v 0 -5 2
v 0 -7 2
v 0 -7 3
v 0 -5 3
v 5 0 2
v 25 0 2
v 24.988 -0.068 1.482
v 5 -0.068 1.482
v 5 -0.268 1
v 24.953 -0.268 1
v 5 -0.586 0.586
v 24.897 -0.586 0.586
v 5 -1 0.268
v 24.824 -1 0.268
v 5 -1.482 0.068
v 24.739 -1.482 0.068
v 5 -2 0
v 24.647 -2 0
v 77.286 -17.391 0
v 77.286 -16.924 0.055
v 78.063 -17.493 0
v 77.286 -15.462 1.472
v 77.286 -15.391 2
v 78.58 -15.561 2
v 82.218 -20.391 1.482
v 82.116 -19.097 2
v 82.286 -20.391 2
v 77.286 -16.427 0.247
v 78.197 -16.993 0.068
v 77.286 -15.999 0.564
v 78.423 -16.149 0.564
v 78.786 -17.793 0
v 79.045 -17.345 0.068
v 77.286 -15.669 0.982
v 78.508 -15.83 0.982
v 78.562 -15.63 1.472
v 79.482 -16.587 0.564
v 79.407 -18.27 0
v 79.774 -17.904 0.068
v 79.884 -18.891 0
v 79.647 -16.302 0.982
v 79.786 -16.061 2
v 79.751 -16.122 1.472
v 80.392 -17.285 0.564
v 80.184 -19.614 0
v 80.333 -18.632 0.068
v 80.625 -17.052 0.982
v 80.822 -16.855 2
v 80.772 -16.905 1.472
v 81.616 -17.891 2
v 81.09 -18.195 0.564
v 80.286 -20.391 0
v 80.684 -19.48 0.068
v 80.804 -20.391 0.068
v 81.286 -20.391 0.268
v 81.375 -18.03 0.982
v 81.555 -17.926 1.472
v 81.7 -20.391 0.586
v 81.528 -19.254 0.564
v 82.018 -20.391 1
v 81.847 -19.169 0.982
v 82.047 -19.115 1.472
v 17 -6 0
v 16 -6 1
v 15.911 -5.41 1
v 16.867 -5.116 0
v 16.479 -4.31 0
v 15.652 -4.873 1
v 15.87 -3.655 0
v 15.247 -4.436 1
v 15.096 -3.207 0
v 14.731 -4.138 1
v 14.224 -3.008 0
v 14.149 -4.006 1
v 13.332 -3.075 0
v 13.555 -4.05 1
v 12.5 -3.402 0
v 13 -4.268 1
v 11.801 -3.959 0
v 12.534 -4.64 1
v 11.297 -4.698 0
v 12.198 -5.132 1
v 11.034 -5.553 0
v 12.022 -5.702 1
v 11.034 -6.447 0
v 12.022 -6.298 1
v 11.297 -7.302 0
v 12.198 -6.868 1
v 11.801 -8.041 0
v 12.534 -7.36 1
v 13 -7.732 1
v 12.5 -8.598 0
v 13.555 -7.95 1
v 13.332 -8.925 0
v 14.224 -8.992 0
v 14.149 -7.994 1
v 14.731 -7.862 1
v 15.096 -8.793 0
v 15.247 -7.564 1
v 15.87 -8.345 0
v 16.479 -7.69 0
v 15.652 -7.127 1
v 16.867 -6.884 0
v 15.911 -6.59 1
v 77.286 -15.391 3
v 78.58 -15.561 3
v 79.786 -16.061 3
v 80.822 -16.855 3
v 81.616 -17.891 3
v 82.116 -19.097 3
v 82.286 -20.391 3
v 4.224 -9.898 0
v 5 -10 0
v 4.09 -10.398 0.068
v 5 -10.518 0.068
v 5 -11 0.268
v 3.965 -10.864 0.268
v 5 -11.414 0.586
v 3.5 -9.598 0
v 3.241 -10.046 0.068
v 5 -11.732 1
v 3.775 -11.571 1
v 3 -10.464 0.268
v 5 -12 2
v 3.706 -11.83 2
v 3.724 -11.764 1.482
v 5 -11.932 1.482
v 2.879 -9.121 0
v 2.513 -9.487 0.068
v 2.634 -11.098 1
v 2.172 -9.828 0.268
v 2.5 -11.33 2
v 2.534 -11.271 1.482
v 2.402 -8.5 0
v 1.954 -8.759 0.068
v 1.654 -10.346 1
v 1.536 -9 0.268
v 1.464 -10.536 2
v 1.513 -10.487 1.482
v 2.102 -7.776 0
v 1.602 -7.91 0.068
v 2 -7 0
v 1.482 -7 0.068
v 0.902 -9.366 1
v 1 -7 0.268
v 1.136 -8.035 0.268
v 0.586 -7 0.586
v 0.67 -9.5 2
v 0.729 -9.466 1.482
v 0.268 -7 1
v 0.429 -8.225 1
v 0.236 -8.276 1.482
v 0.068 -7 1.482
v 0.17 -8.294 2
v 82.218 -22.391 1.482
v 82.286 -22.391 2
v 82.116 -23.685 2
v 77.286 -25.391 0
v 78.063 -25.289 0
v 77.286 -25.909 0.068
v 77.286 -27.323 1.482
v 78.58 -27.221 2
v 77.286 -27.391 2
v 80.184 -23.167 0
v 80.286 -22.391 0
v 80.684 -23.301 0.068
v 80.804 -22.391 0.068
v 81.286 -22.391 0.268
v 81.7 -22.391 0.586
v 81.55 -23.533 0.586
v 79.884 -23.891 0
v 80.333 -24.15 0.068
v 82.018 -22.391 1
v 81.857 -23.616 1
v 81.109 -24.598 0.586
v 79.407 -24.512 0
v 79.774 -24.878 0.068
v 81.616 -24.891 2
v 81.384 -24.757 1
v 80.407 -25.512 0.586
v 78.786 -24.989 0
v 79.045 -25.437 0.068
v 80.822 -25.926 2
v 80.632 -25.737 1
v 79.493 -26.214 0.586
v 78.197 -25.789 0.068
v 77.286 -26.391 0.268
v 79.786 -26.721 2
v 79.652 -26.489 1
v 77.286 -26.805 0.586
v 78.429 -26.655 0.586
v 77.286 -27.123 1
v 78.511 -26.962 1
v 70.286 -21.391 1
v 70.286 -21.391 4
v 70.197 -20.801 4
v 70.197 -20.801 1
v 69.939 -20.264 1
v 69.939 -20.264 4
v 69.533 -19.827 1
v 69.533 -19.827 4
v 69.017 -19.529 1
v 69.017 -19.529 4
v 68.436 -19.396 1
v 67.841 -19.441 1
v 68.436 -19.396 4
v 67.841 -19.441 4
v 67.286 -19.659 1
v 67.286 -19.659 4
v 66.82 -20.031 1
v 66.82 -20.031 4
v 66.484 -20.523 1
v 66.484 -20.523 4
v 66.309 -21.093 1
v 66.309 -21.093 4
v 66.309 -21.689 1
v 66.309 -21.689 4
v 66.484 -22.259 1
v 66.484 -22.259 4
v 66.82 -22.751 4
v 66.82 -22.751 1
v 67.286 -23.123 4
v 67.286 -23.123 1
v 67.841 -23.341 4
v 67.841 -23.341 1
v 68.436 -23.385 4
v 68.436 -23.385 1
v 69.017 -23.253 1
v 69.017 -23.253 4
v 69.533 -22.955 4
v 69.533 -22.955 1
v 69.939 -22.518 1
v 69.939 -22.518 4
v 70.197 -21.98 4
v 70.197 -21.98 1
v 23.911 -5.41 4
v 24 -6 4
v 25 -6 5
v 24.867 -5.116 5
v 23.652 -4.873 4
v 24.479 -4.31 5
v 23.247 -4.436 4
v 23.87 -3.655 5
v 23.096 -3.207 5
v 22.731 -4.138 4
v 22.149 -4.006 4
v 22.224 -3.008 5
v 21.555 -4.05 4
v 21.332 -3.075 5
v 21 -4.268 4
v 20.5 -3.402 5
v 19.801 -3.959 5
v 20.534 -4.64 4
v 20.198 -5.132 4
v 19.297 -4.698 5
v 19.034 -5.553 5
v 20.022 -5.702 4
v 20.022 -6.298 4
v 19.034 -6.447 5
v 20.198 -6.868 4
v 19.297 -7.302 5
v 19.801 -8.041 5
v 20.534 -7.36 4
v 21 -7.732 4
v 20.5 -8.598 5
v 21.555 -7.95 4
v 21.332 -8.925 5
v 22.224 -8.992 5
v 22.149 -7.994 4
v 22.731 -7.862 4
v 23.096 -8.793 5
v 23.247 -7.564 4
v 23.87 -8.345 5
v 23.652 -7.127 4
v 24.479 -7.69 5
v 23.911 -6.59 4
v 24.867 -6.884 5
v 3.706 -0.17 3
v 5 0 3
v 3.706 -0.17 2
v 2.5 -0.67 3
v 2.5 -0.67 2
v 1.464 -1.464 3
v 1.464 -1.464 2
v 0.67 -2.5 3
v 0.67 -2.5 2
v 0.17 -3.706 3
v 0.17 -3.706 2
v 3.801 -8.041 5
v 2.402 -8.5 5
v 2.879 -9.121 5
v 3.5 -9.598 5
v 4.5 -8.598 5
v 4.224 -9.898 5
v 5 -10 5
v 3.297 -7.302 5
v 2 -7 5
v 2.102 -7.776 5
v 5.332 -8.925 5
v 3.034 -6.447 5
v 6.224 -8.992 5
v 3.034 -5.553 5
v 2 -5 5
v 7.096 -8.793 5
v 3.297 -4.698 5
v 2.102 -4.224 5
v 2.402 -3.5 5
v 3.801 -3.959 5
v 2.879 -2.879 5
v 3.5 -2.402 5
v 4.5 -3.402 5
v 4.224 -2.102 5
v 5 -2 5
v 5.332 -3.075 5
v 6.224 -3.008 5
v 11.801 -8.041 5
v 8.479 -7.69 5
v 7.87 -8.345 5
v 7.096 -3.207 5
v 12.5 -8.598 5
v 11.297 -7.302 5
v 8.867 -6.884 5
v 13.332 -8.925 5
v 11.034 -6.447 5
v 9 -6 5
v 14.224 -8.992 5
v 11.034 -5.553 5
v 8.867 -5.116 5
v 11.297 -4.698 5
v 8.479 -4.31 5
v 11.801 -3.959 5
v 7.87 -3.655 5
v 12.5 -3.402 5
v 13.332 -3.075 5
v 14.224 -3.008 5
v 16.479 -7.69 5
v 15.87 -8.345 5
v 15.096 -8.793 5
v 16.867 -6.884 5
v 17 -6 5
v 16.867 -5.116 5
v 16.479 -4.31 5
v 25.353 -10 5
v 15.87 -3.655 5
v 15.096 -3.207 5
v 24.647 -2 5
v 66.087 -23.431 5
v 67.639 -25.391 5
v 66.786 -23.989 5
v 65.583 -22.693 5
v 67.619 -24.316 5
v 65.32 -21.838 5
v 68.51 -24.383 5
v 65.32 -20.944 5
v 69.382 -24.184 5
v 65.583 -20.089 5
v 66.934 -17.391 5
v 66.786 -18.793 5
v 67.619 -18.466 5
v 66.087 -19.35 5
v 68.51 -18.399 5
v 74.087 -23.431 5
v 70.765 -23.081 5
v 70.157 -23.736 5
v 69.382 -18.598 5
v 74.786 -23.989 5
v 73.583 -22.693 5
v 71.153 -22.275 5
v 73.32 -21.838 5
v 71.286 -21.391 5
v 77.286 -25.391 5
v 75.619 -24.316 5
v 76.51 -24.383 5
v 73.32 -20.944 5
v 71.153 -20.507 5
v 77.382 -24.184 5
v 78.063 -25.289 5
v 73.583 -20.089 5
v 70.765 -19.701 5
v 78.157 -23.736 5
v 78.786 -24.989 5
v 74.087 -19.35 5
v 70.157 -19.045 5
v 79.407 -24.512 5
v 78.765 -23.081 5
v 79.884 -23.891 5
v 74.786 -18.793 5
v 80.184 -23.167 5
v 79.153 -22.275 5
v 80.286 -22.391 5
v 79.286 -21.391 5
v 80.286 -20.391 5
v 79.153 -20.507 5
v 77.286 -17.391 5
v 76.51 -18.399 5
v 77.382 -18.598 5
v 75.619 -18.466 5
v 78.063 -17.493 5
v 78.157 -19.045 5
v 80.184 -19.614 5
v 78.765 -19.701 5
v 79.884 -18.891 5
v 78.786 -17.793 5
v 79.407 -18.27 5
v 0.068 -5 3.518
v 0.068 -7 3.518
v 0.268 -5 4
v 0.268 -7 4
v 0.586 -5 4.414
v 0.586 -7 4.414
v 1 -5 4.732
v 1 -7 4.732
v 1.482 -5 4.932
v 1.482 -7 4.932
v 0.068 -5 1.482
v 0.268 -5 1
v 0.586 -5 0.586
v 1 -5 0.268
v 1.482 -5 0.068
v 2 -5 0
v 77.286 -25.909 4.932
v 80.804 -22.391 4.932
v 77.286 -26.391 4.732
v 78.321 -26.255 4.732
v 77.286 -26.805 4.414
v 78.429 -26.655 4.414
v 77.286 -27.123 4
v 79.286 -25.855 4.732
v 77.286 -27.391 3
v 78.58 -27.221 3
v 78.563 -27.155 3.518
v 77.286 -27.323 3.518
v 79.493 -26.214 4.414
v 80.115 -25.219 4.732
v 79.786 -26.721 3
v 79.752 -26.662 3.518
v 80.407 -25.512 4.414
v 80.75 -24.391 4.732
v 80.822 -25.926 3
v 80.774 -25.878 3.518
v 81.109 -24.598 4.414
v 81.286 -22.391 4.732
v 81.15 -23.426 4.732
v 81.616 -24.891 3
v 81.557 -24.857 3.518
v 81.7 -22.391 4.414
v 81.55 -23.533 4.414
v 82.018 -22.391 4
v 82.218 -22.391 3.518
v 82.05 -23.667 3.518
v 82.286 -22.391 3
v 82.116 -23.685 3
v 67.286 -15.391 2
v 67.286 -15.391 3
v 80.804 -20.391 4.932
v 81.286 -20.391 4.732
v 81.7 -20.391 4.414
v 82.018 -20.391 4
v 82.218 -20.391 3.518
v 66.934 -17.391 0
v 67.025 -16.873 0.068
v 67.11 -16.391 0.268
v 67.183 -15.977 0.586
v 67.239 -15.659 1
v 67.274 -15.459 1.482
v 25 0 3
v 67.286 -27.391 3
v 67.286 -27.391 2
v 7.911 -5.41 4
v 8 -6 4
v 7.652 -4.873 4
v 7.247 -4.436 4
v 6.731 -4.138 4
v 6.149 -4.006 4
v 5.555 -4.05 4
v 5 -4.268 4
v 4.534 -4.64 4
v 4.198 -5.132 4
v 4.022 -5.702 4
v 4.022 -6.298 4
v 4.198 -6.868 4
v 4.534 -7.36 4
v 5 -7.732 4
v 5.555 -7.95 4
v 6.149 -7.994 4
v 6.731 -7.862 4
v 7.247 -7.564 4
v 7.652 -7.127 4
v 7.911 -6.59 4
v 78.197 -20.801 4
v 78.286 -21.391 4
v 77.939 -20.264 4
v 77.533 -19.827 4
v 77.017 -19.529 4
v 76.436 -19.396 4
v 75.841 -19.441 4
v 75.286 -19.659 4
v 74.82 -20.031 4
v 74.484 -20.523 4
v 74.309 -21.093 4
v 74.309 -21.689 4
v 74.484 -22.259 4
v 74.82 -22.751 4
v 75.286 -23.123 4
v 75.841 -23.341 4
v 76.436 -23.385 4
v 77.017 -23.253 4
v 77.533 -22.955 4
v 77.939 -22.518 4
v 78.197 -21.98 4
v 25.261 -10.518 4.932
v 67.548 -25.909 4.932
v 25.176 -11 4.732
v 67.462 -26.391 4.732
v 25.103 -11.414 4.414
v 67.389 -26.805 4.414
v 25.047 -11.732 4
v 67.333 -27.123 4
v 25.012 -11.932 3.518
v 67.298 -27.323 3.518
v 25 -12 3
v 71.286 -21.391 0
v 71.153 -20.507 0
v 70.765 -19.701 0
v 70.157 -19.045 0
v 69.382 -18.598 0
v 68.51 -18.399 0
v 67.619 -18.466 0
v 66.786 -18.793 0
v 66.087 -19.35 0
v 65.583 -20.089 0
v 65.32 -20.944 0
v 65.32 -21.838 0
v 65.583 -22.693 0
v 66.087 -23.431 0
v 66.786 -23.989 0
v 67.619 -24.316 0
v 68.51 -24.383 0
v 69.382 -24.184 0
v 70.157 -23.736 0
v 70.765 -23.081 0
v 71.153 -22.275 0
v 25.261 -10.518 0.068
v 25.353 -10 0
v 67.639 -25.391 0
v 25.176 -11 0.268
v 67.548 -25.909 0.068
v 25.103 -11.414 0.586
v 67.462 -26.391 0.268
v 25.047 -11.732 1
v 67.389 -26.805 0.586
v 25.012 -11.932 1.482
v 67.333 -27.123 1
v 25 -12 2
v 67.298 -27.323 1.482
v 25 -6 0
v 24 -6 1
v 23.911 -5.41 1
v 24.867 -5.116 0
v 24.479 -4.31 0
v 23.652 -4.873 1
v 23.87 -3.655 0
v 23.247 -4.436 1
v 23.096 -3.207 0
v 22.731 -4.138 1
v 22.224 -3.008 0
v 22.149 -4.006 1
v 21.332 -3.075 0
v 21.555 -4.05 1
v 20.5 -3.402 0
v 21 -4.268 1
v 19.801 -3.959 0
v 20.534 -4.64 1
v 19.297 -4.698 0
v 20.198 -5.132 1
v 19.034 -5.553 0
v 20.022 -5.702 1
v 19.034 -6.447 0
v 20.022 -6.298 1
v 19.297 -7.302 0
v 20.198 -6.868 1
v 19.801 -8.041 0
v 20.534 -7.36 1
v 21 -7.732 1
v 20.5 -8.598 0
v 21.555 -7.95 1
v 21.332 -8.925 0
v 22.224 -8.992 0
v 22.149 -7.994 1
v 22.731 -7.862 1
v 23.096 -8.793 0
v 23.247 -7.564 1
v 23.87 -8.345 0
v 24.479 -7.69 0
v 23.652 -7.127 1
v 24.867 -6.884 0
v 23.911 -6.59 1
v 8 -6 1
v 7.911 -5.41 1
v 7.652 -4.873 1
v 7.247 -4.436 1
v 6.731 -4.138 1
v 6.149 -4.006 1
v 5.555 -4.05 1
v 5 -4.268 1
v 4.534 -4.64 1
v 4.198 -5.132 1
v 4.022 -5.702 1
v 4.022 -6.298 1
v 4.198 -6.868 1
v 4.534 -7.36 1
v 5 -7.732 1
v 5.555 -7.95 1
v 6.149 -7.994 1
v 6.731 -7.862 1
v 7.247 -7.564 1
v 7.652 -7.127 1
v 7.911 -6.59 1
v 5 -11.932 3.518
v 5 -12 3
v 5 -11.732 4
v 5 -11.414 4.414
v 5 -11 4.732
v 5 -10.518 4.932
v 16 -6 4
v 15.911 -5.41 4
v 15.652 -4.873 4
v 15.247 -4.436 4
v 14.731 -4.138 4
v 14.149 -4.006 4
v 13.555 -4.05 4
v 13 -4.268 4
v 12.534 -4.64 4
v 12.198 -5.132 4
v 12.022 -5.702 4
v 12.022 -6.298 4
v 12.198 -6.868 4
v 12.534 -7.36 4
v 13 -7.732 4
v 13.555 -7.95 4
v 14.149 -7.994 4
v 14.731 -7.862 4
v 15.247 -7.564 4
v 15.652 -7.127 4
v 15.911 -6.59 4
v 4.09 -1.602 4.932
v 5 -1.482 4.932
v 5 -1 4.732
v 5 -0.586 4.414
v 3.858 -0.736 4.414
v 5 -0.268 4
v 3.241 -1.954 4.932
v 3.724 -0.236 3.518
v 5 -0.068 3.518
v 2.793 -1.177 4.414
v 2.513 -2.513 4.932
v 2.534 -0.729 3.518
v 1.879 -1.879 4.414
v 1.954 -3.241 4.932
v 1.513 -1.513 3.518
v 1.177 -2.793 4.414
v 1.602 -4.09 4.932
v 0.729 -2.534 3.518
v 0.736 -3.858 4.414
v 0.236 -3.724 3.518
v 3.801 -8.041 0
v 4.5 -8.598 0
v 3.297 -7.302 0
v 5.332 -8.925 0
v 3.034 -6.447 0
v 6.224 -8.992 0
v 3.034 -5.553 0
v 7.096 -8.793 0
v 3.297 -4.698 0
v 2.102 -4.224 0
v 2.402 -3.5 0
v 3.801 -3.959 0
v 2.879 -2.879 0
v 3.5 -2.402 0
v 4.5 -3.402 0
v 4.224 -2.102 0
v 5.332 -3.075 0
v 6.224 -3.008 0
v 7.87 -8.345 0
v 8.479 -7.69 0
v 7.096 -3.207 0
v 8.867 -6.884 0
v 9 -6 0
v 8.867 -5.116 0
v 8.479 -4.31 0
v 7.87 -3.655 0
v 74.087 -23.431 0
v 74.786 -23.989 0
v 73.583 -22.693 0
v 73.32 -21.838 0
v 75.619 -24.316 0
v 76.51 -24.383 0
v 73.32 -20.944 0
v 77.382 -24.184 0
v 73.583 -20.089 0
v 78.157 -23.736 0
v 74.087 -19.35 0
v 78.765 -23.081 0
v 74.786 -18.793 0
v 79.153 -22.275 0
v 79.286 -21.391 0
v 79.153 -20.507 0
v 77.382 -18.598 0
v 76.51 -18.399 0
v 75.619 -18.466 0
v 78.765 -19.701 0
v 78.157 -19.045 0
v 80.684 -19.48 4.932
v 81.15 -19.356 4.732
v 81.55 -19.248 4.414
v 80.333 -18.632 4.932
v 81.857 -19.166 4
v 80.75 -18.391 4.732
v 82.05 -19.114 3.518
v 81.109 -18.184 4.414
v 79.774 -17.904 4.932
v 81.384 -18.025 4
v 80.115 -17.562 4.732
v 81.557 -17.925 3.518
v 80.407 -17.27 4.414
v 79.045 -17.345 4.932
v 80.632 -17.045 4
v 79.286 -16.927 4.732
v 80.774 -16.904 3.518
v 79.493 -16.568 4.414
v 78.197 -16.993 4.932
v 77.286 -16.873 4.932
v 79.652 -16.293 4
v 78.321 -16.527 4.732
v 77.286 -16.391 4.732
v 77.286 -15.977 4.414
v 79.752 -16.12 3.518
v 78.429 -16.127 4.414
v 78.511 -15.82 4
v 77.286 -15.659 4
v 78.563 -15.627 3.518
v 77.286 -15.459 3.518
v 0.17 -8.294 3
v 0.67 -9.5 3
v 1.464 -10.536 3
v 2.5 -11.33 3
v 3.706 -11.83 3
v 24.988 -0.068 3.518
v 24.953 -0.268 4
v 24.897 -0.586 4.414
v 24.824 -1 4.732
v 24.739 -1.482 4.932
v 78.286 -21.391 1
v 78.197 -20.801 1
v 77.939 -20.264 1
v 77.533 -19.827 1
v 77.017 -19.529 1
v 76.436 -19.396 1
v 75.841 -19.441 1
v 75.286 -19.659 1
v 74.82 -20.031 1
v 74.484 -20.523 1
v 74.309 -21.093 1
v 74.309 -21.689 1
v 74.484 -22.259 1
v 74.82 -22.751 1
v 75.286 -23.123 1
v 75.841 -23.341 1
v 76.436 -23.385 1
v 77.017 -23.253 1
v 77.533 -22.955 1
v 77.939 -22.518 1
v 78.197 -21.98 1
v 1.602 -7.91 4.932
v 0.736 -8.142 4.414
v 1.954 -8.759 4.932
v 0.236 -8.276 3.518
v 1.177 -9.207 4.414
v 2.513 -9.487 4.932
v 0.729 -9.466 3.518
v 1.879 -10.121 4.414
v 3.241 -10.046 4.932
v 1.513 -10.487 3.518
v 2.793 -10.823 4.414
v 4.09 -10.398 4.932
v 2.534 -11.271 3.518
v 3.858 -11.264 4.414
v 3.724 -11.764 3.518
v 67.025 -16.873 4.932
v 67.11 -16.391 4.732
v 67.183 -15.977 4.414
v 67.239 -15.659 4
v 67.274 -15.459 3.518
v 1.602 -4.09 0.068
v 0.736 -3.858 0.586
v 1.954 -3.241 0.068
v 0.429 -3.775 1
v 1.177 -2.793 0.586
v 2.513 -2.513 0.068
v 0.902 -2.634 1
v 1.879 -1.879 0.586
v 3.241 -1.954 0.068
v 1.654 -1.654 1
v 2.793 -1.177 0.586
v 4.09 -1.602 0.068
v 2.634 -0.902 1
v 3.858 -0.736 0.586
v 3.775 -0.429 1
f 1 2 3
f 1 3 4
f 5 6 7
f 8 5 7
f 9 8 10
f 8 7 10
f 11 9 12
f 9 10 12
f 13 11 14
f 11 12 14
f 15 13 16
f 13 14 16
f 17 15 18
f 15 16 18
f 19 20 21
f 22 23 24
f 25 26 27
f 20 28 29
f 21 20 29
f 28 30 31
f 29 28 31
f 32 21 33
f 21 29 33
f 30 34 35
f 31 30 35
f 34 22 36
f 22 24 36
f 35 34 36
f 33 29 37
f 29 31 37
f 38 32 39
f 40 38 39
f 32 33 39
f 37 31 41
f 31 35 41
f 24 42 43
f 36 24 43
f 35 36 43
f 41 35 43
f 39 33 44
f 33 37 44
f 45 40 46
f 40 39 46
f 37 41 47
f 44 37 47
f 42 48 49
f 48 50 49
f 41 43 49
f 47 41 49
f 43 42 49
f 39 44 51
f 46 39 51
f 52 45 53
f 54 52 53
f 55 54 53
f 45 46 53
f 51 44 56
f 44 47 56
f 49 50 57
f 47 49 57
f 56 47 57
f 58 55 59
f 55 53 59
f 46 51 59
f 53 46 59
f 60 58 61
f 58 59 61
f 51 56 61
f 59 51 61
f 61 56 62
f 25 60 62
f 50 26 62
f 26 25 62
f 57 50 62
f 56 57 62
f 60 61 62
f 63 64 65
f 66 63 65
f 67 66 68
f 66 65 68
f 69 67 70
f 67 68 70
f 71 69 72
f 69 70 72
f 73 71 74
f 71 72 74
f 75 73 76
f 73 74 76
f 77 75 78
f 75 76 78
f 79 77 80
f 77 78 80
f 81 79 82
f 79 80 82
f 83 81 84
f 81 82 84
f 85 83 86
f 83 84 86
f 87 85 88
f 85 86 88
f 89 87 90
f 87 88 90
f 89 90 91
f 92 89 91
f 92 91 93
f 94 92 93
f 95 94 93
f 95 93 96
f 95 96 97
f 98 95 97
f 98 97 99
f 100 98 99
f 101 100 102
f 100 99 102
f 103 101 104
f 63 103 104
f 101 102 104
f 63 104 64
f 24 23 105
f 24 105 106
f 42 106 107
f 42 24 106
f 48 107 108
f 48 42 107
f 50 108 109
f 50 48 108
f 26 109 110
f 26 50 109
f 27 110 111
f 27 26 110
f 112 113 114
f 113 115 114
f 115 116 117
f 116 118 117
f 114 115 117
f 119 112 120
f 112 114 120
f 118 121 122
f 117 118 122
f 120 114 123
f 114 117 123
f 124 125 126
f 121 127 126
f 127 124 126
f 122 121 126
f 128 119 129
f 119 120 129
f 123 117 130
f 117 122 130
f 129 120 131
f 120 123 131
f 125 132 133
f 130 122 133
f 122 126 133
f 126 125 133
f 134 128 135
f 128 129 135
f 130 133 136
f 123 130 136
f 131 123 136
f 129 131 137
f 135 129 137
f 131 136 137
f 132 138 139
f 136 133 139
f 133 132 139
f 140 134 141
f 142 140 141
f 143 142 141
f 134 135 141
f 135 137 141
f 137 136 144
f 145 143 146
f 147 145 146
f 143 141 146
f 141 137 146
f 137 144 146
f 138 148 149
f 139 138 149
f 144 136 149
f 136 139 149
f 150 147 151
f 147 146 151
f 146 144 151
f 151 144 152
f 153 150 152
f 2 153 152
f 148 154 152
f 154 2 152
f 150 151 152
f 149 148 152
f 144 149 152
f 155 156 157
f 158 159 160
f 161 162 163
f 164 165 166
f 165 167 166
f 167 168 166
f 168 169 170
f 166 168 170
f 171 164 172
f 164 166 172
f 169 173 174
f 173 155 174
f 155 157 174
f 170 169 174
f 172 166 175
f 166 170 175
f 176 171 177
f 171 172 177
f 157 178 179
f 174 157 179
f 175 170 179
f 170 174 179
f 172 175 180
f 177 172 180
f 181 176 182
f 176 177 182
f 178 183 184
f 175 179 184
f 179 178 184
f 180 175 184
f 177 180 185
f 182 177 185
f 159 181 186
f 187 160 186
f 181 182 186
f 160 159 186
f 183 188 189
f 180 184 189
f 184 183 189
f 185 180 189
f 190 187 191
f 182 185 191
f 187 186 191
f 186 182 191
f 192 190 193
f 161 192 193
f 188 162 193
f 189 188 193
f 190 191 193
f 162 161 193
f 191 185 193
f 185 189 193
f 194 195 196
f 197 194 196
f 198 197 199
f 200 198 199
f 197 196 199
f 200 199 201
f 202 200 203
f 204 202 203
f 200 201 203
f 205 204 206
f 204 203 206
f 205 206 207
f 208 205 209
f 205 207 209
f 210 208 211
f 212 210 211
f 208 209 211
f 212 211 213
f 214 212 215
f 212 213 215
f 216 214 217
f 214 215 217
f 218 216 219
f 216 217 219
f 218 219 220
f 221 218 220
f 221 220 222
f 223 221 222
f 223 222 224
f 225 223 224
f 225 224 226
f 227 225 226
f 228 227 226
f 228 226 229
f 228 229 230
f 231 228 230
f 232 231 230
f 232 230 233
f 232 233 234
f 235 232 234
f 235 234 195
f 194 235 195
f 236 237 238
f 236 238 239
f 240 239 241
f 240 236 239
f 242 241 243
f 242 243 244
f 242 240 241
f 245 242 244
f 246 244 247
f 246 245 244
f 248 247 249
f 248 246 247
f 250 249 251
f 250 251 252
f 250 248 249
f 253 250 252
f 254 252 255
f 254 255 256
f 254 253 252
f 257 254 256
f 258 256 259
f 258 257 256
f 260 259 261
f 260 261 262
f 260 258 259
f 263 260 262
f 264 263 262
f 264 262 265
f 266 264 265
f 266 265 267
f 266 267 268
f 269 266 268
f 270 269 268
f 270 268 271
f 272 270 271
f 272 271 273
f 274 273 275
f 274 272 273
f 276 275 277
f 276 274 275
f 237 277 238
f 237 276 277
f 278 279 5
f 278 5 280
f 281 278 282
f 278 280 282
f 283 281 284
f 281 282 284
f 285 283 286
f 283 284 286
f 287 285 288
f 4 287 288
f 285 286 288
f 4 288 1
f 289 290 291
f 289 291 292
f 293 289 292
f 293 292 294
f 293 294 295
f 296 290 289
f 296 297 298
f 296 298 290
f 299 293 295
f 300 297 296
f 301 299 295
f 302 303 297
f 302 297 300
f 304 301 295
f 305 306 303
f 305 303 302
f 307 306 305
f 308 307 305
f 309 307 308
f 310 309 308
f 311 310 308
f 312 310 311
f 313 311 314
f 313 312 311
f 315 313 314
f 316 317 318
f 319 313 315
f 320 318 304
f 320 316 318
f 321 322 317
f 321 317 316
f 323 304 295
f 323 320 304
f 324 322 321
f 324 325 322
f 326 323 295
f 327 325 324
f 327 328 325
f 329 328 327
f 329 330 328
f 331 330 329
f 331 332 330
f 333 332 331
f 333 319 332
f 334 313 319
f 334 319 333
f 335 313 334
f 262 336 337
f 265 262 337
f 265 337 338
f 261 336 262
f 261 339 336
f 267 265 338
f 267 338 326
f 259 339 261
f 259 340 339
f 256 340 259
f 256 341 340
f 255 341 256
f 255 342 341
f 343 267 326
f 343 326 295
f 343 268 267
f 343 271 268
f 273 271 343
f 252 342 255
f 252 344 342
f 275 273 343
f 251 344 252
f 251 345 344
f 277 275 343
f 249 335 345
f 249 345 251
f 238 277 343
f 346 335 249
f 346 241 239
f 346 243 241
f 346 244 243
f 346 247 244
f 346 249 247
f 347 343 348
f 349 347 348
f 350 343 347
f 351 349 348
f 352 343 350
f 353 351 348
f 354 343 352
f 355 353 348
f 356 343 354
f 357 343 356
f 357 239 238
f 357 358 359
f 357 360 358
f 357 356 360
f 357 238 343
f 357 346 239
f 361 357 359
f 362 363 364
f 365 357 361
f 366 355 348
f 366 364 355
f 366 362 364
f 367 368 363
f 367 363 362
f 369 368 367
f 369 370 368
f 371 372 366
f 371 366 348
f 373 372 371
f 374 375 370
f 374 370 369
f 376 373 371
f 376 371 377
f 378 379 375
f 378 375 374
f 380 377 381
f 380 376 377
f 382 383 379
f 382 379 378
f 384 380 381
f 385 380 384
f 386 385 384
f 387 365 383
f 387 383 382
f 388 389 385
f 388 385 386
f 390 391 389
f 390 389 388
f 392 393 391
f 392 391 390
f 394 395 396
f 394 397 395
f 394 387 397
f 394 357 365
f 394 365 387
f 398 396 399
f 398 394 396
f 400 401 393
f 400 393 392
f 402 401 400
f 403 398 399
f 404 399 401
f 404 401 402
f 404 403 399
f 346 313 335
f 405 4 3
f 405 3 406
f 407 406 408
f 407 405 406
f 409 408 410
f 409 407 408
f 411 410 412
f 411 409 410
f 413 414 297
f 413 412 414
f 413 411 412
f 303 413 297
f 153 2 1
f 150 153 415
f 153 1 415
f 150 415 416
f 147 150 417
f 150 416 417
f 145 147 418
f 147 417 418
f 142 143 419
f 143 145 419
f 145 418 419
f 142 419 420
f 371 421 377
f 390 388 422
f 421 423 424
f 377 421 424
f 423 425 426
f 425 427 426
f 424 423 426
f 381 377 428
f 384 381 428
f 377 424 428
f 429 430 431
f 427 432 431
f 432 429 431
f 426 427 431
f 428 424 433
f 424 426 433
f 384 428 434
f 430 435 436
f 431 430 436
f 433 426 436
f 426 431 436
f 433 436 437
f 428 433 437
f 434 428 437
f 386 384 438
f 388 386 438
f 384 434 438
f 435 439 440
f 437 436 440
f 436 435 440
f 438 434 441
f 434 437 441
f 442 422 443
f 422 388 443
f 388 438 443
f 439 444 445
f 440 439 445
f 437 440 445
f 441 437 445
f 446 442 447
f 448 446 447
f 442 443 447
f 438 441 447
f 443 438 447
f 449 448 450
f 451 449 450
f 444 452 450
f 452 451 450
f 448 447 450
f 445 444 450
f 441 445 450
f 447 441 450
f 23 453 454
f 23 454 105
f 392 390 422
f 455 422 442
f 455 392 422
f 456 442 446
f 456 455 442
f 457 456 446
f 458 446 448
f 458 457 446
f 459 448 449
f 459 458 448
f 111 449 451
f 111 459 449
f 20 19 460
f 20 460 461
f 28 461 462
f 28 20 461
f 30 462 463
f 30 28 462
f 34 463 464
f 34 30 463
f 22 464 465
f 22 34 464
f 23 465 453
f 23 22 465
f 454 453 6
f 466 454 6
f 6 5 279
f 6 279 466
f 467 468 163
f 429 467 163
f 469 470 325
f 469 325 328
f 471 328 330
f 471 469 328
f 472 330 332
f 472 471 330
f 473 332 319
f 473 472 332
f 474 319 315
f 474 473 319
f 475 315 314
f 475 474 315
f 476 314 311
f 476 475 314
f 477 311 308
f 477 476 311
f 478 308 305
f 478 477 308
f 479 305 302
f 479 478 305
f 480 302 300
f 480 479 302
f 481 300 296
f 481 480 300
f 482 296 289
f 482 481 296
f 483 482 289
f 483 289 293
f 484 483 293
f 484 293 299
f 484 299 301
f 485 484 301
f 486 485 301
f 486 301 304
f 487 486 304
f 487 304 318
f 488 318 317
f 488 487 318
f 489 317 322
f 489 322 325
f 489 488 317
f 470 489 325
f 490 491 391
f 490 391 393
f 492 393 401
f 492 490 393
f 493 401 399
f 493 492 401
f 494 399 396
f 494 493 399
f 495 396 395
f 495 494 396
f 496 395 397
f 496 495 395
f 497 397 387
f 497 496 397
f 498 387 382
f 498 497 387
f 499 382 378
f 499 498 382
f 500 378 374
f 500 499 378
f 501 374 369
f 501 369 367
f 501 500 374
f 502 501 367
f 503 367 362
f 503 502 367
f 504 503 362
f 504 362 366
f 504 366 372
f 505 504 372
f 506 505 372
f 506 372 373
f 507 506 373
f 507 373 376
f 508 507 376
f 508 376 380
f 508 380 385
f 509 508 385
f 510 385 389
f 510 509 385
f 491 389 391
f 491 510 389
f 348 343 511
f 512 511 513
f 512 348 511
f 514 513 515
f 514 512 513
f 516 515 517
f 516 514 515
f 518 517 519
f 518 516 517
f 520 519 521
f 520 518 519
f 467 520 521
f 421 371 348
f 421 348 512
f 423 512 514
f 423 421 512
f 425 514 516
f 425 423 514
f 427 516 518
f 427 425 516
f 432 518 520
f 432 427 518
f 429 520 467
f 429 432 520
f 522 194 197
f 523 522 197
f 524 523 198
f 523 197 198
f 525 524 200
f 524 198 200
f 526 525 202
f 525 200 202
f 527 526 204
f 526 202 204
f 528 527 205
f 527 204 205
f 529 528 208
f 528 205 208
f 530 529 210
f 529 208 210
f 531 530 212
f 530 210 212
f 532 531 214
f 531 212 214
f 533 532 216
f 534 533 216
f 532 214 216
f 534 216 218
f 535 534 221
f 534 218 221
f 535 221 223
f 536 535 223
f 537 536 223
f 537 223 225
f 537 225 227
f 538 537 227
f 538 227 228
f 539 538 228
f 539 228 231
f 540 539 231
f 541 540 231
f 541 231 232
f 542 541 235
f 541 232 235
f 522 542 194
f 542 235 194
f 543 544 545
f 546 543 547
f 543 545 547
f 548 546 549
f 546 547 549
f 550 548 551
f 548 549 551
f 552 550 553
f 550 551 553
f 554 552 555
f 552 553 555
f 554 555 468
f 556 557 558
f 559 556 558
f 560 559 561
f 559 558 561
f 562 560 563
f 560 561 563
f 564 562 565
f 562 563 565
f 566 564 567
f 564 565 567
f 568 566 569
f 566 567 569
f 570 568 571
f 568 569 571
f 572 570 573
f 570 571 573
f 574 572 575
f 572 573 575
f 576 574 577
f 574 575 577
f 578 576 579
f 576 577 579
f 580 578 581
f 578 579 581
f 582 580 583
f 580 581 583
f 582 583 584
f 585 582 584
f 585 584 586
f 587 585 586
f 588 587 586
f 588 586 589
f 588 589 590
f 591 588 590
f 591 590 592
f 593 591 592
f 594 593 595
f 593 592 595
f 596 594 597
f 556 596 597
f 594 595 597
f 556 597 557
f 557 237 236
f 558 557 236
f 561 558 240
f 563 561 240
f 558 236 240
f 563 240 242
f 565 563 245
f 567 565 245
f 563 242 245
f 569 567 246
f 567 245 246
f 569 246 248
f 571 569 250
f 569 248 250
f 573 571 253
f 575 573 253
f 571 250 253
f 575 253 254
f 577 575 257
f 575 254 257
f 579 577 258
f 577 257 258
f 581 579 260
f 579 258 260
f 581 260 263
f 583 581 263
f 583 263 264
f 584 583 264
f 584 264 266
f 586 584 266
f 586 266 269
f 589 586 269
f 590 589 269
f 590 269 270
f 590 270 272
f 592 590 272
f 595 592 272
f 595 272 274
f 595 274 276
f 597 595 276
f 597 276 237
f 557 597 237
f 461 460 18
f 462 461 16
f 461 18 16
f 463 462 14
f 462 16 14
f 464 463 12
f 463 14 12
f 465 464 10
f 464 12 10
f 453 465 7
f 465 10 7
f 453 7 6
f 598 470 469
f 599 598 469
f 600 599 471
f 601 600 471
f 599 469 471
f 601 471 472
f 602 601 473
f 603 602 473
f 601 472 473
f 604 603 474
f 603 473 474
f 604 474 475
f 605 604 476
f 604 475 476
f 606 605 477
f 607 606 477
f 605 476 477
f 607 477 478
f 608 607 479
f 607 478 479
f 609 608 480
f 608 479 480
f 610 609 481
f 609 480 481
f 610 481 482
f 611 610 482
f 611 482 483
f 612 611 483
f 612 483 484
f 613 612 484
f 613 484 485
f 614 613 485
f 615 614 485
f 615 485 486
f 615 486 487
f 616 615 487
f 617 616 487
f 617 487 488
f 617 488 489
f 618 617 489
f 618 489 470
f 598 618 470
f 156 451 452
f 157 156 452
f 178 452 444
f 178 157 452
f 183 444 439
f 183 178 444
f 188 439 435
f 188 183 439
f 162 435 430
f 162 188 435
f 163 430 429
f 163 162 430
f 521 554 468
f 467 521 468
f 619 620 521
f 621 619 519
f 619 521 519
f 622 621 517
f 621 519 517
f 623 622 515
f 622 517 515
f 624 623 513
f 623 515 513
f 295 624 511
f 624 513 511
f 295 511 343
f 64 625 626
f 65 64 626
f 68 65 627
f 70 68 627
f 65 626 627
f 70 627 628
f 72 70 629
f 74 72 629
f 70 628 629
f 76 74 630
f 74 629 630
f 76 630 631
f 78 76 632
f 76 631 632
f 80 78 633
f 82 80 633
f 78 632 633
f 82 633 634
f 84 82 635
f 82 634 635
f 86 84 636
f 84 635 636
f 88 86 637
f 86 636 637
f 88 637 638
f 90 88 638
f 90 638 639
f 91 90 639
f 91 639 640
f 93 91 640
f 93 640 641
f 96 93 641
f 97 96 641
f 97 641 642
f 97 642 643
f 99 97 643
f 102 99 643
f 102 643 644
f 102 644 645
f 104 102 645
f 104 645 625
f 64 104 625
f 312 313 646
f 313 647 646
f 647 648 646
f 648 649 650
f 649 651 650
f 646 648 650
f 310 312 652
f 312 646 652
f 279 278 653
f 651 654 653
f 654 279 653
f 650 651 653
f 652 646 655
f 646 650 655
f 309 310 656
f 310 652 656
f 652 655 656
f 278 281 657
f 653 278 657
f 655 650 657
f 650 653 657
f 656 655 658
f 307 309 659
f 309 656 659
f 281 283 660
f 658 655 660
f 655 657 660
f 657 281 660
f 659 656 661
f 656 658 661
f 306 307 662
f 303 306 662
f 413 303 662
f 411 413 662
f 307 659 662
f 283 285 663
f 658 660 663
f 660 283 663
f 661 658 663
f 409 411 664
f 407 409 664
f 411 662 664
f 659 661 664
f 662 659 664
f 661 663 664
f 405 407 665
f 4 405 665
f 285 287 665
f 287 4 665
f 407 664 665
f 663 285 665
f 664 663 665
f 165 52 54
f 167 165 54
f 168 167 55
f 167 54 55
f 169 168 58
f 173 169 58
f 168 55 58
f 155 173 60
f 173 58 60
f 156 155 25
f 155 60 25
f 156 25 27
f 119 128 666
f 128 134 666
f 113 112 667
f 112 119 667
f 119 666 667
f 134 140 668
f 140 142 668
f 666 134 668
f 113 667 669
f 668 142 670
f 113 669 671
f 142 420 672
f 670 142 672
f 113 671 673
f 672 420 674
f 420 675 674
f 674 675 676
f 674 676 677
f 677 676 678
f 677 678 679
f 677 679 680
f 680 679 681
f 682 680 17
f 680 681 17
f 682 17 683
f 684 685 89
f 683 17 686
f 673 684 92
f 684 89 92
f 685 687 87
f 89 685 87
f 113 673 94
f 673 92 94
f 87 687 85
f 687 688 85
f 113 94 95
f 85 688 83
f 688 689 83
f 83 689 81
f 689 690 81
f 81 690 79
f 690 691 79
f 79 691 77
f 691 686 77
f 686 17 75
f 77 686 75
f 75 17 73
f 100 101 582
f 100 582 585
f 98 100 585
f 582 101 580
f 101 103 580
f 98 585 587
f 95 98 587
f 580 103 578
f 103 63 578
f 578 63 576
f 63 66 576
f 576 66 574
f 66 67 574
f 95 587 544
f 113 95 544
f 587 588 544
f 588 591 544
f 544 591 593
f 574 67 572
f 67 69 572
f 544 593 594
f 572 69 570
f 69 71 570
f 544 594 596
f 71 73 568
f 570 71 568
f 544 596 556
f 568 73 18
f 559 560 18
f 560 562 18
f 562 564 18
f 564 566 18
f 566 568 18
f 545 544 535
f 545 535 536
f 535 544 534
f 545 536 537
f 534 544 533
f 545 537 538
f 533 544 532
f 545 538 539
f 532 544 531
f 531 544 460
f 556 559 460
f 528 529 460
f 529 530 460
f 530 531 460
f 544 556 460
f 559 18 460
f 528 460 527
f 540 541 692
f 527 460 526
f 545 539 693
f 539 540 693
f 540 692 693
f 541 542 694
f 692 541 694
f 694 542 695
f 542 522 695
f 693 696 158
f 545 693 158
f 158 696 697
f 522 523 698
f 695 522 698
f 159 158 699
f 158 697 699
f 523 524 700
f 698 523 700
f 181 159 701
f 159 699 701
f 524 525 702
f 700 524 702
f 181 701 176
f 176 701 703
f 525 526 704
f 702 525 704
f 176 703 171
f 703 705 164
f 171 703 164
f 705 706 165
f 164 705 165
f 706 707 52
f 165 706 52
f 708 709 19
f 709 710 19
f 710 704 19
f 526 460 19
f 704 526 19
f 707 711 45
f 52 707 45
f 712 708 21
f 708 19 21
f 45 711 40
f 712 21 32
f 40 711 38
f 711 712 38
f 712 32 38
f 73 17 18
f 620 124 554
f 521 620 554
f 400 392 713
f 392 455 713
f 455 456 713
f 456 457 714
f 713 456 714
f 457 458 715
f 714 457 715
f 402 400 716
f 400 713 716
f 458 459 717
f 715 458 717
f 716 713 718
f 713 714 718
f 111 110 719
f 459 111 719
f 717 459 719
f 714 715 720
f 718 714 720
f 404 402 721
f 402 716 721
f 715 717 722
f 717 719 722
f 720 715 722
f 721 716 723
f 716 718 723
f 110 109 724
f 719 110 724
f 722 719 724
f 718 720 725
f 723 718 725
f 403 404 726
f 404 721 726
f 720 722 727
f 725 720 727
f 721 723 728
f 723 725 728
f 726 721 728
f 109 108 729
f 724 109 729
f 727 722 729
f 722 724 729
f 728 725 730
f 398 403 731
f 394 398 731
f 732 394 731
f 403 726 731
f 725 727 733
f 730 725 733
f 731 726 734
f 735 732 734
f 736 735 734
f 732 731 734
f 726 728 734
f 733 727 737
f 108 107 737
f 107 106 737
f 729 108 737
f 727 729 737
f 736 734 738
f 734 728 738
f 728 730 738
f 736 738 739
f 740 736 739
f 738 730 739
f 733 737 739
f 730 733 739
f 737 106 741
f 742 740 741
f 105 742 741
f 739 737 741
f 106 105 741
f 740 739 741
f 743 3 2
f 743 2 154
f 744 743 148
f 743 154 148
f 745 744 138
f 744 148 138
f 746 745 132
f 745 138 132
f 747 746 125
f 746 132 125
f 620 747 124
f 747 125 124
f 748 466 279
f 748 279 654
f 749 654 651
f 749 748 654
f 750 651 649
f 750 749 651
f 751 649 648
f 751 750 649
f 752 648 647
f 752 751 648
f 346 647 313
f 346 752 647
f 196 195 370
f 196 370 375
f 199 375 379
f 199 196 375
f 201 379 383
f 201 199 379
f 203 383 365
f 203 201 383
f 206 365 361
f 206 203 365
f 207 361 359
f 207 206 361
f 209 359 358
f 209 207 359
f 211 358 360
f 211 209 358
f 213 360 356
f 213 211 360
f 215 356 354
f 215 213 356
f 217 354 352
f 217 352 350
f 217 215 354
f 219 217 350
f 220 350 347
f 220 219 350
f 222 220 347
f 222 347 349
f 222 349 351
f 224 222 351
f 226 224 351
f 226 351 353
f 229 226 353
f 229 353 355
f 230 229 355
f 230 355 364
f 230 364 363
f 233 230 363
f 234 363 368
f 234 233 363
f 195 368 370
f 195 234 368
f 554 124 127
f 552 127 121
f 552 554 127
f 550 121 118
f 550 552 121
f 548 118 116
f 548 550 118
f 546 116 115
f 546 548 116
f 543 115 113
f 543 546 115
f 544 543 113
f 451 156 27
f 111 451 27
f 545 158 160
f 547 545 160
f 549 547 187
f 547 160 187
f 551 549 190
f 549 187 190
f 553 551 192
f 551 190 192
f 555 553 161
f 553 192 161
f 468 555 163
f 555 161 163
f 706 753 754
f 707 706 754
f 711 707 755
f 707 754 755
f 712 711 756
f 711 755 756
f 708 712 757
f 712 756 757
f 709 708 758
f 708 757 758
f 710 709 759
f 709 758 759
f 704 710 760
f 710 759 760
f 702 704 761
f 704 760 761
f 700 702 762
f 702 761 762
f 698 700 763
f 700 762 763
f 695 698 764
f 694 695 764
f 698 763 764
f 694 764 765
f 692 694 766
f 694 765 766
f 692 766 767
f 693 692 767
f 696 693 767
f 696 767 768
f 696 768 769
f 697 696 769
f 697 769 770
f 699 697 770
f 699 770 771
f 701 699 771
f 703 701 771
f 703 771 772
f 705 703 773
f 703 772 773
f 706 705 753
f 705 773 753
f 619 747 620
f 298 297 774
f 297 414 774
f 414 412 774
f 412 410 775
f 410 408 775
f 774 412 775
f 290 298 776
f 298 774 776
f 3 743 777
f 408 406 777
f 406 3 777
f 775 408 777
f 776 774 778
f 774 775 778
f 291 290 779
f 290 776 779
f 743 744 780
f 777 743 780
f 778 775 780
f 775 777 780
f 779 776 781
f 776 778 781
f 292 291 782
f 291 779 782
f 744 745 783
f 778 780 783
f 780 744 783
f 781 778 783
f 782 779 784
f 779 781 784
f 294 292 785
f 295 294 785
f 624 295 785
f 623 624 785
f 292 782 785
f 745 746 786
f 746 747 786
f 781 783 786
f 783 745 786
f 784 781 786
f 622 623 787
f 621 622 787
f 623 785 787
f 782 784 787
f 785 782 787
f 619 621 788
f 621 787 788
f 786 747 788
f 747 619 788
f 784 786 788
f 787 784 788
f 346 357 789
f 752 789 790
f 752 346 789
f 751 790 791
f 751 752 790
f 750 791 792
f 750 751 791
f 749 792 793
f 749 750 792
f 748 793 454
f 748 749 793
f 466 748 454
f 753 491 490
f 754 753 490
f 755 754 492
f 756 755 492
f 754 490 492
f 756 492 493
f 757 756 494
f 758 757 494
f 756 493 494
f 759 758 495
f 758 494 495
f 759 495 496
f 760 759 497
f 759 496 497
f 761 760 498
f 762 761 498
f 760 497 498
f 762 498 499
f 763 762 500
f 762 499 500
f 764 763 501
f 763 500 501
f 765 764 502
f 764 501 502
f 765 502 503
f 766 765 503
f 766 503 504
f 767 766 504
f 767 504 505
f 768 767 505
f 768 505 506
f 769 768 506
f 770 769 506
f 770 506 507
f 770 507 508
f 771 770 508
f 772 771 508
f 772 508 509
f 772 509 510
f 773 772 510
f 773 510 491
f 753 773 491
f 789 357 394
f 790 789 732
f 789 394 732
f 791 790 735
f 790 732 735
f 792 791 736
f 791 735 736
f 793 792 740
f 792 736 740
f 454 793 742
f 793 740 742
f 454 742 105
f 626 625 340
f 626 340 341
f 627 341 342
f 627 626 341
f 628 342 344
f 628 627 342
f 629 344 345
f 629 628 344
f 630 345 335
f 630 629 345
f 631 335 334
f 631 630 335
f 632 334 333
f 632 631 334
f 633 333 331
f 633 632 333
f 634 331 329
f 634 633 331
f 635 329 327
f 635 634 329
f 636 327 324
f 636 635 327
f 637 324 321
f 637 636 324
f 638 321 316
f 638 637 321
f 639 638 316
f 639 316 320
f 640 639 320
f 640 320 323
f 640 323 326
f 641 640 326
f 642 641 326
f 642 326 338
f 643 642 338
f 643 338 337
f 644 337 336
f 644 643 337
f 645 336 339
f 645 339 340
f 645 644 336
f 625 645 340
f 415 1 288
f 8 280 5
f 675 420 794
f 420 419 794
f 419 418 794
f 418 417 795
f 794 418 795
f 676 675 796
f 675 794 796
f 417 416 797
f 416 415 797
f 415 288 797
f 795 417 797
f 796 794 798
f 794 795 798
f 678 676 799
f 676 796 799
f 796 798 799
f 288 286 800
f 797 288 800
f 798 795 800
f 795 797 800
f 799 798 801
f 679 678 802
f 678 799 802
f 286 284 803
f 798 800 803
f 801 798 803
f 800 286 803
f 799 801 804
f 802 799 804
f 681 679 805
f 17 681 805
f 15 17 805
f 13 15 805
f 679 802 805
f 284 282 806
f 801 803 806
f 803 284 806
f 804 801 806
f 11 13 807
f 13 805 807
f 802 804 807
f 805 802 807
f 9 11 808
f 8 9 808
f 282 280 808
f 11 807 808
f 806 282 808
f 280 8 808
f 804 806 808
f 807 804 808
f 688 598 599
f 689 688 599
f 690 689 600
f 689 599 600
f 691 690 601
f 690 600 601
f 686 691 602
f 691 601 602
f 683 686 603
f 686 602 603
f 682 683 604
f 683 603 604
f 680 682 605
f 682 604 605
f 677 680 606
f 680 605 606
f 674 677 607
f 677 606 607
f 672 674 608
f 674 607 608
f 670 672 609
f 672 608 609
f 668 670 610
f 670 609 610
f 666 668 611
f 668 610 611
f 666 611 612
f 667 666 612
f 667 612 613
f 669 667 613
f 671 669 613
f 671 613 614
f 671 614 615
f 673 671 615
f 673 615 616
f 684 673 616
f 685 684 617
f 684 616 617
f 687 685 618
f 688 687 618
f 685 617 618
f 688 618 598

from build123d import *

# Parameters (mm, degrees)
F0_W         = 25
F0_H         = 12
F0_W_2       = 15
F1_DEPTH     = 5
F2_R         = 2
F3_DEPTH     = 5.001
F4_R         = 2
F5_T1_DEPTH  = 5
F5_T4_ANGLE  = 90
F5_T6_ANGLE  = 90
F5_T8_ANGLE  = 90
F5_T10_ANGLE = 90
F5_T12_ANGLE = 90
F5_T14_ANGLE = 90
F5_T16_ANGLE = 90
F5_T18_ANGLE = 90
F6_SIZE      = 1


# Not quite as in the source:
# - a fillet or chamfer that OpenCascade refuses, or shapes differently, is made with other operations: its cross-section is extruded or revolved along the edge and cut away or added


with BuildPart() as f1:
    # F0 (on Top) → F1 (new body)
    with BuildSketch(Plane.XY):
        with Locations((12.5, -6)):
            Rectangle(F0_W, F0_H)
        Polygon((67.2861679354, -15.3909064497), (25, 0), (25, -12), (67.2861679354, -27.3909064497), align=None)
        with Locations((74.7861679354, -21.3909064497)):
            Rectangle(F0_W_2, F0_H)
    extrude(amount=F1_DEPTH)

    # F2 (on face) → F3 (cut, through all)
    with BuildSketch(Plane.XY.offset(5)):
        with Locations((6, -6)):
            Circle(F2_R)
        with Locations((76.2861679354, -21.3909064497)):
            Circle(F2_R)
        with Locations((14, -6)):
            Circle(F2_R)
        with Locations((22, -6)):
            Circle(F2_R)
        with Locations((68.2861679354, -21.3909064497)):
            Circle(F2_R)
    extrude(amount=-F3_DEPTH, mode=Mode.SUBTRACT)

    # F4
    f4_edges = [f1.edges().sort_by_distance(p)[0] for p in [
        (46.143084, -7.695453, 5),
        (74.786168, -15.390906, 5),
        (82.286168, -21.390906, 5),
        (74.786168, -27.390906, 5),
        (46.143084, -19.695453, 5),
        (12.5, -12, 5),
        (0, -6, 5),
        (12.5, 0, 5),
        (12.5, -12, 0),
        (0, -6, 0),
        (12.5, 0, 0),
        (46.143084, -7.695453, 0),
        (46.143084, -19.695453, 0),
        (74.786168, -27.390906, 0),
        (74.786168, -15.390906, 0),
        (82.286168, -21.390906, 0),
    ]]
    fillet(f4_edges, radius=F4_R)

    # F5: fillet of radius 5 on 4 edges, made by hand

    # F5_s2 → F5_t1 (cut)
    with BuildSketch(Plane.XY):
        with BuildLine():
            ThreePointArc((77.2861679354, -15.3909064497), (80.8217018413, -16.8553725437), (82.2861679354, -20.3909064497))
            Line((82.2861679354, -20.3909064497), (82.2861679354, -15.3909064497))
            Line((82.2861679354, -15.3909064497), (77.2861679354, -15.3909064497))
        make_face()
        with BuildLine():
            ThreePointArc((82.2861679354, -22.3909064497), (80.8217018413, -25.9264403556), (77.2861679354, -27.3909064497))
            Line((77.2861679354, -27.3909064497), (82.2861679354, -27.3909064497))
            Line((82.2861679354, -27.3909064497), (82.2861679354, -22.3909064497))
        make_face()
        with BuildLine():
            ThreePointArc((0, -7), (1.4644660941, -10.5355339059), (5, -12))
            Line((5, -12), (0, -12))
            Line((0, -12), (0, -7))
        make_face()
        with BuildLine():
            ThreePointArc((5, 0), (1.4644660941, -1.4644660941), (0, -5))
            Line((0, -5), (0, 0))
            Line((0, 0), (5, 0))
        make_face()
    extrude(amount=F5_T1_DEPTH, mode=Mode.SUBTRACT)

    # F5_s3 → F5_t4 (revolve, cut)
    with BuildSketch(Plane.XZ.offset(5)):
        with BuildLine():
            ThreePointArc((2, 0), (0.5857864376, 0.5857864376), (0, 2))
            Line((0, 2), (0, 0))
            Line((0, 0), (2, 0))
        make_face()
    revolve(axis=Axis((5, -5, 0), (0, 0, -1)), revolution_arc=F5_T4_ANGLE, mode=Mode.SUBTRACT)

    # F5_s5 → F5_t6 (revolve, cut)
    with BuildSketch(Plane.YZ.offset(5)):
        with BuildLine():
            ThreePointArc((-10, 0), (-11.4142135624, 0.5857864376), (-12, 2))
            Line((-12, 2), (-12, 0))
            Line((-12, 0), (-10, 0))
        make_face()
    revolve(axis=Axis((5, -7, 0), (0, 0, -1)), revolution_arc=F5_T6_ANGLE, mode=Mode.SUBTRACT)

    # F5_s7 → F5_t8 (revolve, cut)
    with BuildSketch(Plane.XZ.offset(22.3909064497)):
        with BuildLine():
            ThreePointArc((80.2861679354, 0), (81.7003814977, 0.5857864376), (82.2861679354, 2))
            Line((82.2861679354, 2), (82.2861679354, 0))
            Line((82.2861679354, 0), (80.2861679354, 0))
        make_face()
    revolve(axis=Axis((77.2861679354, -22.3909064497, 0), (0, 0, -1)), revolution_arc=F5_T8_ANGLE, mode=Mode.SUBTRACT)

    # F5_s9 → F5_t10 (revolve, cut)
    with BuildSketch(Plane.YZ.offset(77.2861679354)):
        with BuildLine():
            ThreePointArc((-17.3909064497, 0), (-15.9766928873, 0.5857864376), (-15.3909064497, 2))
            Line((-15.3909064497, 2), (-15.3909064497, 0))
            Line((-15.3909064497, 0), (-17.3909064497, 0))
        make_face()
    revolve(axis=Axis((77.2861679354, -20.3909064497, 0), (0, 0, -1)), revolution_arc=F5_T10_ANGLE, mode=Mode.SUBTRACT)

    # F5_s11 → F5_t12 (revolve, cut)
    with BuildSketch(Plane.XZ.offset(20.3909064497)):
        with BuildLine():
            ThreePointArc((80.2861679354, 5), (81.7003814977, 4.4142135624), (82.2861679354, 3))
            Line((82.2861679354, 3), (82.2861679354, 5))
            Line((82.2861679354, 5), (80.2861679354, 5))
        make_face()
    revolve(axis=Axis((77.2861679354, -20.3909064497, 5), (0, 0, 1)), revolution_arc=F5_T12_ANGLE, mode=Mode.SUBTRACT)

    # F5_s13 → F5_t14 (revolve, cut)
    with BuildSketch(Plane.YZ.offset(77.2861679354)):
        with BuildLine():
            ThreePointArc((-25.3909064497, 5), (-26.805120012, 4.4142135624), (-27.3909064497, 3))
            Line((-27.3909064497, 3), (-27.3909064497, 5))
            Line((-27.3909064497, 5), (-25.3909064497, 5))
        make_face()
    revolve(axis=Axis((77.2861679354, -22.3909064497, 5), (0, 0, 1)), revolution_arc=F5_T14_ANGLE, mode=Mode.SUBTRACT)

    # F5_s15 → F5_t16 (revolve, cut)
    with BuildSketch(Plane.XZ.offset(7)):
        with BuildLine():
            ThreePointArc((2, 5), (0.5857864376, 4.4142135624), (0, 3))
            Line((0, 3), (0, 5))
            Line((0, 5), (2, 5))
        make_face()
    revolve(axis=Axis((5, -7, 5), (0, 0, 1)), revolution_arc=F5_T16_ANGLE, mode=Mode.SUBTRACT)

    # F5_s17 → F5_t18 (revolve, cut)
    with BuildSketch(Plane.YZ.offset(5)):
        with BuildLine():
            ThreePointArc((-2, 5), (-0.5857864376, 4.4142135624), (0, 3))
            Line((0, 3), (0, 5))
            Line((0, 5), (-2, 5))
        make_face()
    revolve(axis=Axis((5, -5, 5), (0, 0, 1)), revolution_arc=F5_T18_ANGLE, mode=Mode.SUBTRACT)

    # F6
    f6_edges = [f1.edges().sort_by_distance(p)[0] for p in [
        (20, -6, 5),
        (24, -6, 2.5),
        (20, -6, 0),
        (12, -6, 5),
        (16, -6, 2.5),
        (12, -6, 0),
        (4, -6, 5),
        (8, -6, 2.5),
        (4, -6, 0),
        (66.286168, -21.390906, 5),
        (70.286168, -21.390906, 2.5),
        (66.286168, -21.390906, 0),
        (74.286168, -21.390906, 5),
        (78.286168, -21.390906, 2.5),
        (74.286168, -21.390906, 0),
    ]]
    chamfer(f6_edges, length=F6_SIZE)


solid = f1.part
